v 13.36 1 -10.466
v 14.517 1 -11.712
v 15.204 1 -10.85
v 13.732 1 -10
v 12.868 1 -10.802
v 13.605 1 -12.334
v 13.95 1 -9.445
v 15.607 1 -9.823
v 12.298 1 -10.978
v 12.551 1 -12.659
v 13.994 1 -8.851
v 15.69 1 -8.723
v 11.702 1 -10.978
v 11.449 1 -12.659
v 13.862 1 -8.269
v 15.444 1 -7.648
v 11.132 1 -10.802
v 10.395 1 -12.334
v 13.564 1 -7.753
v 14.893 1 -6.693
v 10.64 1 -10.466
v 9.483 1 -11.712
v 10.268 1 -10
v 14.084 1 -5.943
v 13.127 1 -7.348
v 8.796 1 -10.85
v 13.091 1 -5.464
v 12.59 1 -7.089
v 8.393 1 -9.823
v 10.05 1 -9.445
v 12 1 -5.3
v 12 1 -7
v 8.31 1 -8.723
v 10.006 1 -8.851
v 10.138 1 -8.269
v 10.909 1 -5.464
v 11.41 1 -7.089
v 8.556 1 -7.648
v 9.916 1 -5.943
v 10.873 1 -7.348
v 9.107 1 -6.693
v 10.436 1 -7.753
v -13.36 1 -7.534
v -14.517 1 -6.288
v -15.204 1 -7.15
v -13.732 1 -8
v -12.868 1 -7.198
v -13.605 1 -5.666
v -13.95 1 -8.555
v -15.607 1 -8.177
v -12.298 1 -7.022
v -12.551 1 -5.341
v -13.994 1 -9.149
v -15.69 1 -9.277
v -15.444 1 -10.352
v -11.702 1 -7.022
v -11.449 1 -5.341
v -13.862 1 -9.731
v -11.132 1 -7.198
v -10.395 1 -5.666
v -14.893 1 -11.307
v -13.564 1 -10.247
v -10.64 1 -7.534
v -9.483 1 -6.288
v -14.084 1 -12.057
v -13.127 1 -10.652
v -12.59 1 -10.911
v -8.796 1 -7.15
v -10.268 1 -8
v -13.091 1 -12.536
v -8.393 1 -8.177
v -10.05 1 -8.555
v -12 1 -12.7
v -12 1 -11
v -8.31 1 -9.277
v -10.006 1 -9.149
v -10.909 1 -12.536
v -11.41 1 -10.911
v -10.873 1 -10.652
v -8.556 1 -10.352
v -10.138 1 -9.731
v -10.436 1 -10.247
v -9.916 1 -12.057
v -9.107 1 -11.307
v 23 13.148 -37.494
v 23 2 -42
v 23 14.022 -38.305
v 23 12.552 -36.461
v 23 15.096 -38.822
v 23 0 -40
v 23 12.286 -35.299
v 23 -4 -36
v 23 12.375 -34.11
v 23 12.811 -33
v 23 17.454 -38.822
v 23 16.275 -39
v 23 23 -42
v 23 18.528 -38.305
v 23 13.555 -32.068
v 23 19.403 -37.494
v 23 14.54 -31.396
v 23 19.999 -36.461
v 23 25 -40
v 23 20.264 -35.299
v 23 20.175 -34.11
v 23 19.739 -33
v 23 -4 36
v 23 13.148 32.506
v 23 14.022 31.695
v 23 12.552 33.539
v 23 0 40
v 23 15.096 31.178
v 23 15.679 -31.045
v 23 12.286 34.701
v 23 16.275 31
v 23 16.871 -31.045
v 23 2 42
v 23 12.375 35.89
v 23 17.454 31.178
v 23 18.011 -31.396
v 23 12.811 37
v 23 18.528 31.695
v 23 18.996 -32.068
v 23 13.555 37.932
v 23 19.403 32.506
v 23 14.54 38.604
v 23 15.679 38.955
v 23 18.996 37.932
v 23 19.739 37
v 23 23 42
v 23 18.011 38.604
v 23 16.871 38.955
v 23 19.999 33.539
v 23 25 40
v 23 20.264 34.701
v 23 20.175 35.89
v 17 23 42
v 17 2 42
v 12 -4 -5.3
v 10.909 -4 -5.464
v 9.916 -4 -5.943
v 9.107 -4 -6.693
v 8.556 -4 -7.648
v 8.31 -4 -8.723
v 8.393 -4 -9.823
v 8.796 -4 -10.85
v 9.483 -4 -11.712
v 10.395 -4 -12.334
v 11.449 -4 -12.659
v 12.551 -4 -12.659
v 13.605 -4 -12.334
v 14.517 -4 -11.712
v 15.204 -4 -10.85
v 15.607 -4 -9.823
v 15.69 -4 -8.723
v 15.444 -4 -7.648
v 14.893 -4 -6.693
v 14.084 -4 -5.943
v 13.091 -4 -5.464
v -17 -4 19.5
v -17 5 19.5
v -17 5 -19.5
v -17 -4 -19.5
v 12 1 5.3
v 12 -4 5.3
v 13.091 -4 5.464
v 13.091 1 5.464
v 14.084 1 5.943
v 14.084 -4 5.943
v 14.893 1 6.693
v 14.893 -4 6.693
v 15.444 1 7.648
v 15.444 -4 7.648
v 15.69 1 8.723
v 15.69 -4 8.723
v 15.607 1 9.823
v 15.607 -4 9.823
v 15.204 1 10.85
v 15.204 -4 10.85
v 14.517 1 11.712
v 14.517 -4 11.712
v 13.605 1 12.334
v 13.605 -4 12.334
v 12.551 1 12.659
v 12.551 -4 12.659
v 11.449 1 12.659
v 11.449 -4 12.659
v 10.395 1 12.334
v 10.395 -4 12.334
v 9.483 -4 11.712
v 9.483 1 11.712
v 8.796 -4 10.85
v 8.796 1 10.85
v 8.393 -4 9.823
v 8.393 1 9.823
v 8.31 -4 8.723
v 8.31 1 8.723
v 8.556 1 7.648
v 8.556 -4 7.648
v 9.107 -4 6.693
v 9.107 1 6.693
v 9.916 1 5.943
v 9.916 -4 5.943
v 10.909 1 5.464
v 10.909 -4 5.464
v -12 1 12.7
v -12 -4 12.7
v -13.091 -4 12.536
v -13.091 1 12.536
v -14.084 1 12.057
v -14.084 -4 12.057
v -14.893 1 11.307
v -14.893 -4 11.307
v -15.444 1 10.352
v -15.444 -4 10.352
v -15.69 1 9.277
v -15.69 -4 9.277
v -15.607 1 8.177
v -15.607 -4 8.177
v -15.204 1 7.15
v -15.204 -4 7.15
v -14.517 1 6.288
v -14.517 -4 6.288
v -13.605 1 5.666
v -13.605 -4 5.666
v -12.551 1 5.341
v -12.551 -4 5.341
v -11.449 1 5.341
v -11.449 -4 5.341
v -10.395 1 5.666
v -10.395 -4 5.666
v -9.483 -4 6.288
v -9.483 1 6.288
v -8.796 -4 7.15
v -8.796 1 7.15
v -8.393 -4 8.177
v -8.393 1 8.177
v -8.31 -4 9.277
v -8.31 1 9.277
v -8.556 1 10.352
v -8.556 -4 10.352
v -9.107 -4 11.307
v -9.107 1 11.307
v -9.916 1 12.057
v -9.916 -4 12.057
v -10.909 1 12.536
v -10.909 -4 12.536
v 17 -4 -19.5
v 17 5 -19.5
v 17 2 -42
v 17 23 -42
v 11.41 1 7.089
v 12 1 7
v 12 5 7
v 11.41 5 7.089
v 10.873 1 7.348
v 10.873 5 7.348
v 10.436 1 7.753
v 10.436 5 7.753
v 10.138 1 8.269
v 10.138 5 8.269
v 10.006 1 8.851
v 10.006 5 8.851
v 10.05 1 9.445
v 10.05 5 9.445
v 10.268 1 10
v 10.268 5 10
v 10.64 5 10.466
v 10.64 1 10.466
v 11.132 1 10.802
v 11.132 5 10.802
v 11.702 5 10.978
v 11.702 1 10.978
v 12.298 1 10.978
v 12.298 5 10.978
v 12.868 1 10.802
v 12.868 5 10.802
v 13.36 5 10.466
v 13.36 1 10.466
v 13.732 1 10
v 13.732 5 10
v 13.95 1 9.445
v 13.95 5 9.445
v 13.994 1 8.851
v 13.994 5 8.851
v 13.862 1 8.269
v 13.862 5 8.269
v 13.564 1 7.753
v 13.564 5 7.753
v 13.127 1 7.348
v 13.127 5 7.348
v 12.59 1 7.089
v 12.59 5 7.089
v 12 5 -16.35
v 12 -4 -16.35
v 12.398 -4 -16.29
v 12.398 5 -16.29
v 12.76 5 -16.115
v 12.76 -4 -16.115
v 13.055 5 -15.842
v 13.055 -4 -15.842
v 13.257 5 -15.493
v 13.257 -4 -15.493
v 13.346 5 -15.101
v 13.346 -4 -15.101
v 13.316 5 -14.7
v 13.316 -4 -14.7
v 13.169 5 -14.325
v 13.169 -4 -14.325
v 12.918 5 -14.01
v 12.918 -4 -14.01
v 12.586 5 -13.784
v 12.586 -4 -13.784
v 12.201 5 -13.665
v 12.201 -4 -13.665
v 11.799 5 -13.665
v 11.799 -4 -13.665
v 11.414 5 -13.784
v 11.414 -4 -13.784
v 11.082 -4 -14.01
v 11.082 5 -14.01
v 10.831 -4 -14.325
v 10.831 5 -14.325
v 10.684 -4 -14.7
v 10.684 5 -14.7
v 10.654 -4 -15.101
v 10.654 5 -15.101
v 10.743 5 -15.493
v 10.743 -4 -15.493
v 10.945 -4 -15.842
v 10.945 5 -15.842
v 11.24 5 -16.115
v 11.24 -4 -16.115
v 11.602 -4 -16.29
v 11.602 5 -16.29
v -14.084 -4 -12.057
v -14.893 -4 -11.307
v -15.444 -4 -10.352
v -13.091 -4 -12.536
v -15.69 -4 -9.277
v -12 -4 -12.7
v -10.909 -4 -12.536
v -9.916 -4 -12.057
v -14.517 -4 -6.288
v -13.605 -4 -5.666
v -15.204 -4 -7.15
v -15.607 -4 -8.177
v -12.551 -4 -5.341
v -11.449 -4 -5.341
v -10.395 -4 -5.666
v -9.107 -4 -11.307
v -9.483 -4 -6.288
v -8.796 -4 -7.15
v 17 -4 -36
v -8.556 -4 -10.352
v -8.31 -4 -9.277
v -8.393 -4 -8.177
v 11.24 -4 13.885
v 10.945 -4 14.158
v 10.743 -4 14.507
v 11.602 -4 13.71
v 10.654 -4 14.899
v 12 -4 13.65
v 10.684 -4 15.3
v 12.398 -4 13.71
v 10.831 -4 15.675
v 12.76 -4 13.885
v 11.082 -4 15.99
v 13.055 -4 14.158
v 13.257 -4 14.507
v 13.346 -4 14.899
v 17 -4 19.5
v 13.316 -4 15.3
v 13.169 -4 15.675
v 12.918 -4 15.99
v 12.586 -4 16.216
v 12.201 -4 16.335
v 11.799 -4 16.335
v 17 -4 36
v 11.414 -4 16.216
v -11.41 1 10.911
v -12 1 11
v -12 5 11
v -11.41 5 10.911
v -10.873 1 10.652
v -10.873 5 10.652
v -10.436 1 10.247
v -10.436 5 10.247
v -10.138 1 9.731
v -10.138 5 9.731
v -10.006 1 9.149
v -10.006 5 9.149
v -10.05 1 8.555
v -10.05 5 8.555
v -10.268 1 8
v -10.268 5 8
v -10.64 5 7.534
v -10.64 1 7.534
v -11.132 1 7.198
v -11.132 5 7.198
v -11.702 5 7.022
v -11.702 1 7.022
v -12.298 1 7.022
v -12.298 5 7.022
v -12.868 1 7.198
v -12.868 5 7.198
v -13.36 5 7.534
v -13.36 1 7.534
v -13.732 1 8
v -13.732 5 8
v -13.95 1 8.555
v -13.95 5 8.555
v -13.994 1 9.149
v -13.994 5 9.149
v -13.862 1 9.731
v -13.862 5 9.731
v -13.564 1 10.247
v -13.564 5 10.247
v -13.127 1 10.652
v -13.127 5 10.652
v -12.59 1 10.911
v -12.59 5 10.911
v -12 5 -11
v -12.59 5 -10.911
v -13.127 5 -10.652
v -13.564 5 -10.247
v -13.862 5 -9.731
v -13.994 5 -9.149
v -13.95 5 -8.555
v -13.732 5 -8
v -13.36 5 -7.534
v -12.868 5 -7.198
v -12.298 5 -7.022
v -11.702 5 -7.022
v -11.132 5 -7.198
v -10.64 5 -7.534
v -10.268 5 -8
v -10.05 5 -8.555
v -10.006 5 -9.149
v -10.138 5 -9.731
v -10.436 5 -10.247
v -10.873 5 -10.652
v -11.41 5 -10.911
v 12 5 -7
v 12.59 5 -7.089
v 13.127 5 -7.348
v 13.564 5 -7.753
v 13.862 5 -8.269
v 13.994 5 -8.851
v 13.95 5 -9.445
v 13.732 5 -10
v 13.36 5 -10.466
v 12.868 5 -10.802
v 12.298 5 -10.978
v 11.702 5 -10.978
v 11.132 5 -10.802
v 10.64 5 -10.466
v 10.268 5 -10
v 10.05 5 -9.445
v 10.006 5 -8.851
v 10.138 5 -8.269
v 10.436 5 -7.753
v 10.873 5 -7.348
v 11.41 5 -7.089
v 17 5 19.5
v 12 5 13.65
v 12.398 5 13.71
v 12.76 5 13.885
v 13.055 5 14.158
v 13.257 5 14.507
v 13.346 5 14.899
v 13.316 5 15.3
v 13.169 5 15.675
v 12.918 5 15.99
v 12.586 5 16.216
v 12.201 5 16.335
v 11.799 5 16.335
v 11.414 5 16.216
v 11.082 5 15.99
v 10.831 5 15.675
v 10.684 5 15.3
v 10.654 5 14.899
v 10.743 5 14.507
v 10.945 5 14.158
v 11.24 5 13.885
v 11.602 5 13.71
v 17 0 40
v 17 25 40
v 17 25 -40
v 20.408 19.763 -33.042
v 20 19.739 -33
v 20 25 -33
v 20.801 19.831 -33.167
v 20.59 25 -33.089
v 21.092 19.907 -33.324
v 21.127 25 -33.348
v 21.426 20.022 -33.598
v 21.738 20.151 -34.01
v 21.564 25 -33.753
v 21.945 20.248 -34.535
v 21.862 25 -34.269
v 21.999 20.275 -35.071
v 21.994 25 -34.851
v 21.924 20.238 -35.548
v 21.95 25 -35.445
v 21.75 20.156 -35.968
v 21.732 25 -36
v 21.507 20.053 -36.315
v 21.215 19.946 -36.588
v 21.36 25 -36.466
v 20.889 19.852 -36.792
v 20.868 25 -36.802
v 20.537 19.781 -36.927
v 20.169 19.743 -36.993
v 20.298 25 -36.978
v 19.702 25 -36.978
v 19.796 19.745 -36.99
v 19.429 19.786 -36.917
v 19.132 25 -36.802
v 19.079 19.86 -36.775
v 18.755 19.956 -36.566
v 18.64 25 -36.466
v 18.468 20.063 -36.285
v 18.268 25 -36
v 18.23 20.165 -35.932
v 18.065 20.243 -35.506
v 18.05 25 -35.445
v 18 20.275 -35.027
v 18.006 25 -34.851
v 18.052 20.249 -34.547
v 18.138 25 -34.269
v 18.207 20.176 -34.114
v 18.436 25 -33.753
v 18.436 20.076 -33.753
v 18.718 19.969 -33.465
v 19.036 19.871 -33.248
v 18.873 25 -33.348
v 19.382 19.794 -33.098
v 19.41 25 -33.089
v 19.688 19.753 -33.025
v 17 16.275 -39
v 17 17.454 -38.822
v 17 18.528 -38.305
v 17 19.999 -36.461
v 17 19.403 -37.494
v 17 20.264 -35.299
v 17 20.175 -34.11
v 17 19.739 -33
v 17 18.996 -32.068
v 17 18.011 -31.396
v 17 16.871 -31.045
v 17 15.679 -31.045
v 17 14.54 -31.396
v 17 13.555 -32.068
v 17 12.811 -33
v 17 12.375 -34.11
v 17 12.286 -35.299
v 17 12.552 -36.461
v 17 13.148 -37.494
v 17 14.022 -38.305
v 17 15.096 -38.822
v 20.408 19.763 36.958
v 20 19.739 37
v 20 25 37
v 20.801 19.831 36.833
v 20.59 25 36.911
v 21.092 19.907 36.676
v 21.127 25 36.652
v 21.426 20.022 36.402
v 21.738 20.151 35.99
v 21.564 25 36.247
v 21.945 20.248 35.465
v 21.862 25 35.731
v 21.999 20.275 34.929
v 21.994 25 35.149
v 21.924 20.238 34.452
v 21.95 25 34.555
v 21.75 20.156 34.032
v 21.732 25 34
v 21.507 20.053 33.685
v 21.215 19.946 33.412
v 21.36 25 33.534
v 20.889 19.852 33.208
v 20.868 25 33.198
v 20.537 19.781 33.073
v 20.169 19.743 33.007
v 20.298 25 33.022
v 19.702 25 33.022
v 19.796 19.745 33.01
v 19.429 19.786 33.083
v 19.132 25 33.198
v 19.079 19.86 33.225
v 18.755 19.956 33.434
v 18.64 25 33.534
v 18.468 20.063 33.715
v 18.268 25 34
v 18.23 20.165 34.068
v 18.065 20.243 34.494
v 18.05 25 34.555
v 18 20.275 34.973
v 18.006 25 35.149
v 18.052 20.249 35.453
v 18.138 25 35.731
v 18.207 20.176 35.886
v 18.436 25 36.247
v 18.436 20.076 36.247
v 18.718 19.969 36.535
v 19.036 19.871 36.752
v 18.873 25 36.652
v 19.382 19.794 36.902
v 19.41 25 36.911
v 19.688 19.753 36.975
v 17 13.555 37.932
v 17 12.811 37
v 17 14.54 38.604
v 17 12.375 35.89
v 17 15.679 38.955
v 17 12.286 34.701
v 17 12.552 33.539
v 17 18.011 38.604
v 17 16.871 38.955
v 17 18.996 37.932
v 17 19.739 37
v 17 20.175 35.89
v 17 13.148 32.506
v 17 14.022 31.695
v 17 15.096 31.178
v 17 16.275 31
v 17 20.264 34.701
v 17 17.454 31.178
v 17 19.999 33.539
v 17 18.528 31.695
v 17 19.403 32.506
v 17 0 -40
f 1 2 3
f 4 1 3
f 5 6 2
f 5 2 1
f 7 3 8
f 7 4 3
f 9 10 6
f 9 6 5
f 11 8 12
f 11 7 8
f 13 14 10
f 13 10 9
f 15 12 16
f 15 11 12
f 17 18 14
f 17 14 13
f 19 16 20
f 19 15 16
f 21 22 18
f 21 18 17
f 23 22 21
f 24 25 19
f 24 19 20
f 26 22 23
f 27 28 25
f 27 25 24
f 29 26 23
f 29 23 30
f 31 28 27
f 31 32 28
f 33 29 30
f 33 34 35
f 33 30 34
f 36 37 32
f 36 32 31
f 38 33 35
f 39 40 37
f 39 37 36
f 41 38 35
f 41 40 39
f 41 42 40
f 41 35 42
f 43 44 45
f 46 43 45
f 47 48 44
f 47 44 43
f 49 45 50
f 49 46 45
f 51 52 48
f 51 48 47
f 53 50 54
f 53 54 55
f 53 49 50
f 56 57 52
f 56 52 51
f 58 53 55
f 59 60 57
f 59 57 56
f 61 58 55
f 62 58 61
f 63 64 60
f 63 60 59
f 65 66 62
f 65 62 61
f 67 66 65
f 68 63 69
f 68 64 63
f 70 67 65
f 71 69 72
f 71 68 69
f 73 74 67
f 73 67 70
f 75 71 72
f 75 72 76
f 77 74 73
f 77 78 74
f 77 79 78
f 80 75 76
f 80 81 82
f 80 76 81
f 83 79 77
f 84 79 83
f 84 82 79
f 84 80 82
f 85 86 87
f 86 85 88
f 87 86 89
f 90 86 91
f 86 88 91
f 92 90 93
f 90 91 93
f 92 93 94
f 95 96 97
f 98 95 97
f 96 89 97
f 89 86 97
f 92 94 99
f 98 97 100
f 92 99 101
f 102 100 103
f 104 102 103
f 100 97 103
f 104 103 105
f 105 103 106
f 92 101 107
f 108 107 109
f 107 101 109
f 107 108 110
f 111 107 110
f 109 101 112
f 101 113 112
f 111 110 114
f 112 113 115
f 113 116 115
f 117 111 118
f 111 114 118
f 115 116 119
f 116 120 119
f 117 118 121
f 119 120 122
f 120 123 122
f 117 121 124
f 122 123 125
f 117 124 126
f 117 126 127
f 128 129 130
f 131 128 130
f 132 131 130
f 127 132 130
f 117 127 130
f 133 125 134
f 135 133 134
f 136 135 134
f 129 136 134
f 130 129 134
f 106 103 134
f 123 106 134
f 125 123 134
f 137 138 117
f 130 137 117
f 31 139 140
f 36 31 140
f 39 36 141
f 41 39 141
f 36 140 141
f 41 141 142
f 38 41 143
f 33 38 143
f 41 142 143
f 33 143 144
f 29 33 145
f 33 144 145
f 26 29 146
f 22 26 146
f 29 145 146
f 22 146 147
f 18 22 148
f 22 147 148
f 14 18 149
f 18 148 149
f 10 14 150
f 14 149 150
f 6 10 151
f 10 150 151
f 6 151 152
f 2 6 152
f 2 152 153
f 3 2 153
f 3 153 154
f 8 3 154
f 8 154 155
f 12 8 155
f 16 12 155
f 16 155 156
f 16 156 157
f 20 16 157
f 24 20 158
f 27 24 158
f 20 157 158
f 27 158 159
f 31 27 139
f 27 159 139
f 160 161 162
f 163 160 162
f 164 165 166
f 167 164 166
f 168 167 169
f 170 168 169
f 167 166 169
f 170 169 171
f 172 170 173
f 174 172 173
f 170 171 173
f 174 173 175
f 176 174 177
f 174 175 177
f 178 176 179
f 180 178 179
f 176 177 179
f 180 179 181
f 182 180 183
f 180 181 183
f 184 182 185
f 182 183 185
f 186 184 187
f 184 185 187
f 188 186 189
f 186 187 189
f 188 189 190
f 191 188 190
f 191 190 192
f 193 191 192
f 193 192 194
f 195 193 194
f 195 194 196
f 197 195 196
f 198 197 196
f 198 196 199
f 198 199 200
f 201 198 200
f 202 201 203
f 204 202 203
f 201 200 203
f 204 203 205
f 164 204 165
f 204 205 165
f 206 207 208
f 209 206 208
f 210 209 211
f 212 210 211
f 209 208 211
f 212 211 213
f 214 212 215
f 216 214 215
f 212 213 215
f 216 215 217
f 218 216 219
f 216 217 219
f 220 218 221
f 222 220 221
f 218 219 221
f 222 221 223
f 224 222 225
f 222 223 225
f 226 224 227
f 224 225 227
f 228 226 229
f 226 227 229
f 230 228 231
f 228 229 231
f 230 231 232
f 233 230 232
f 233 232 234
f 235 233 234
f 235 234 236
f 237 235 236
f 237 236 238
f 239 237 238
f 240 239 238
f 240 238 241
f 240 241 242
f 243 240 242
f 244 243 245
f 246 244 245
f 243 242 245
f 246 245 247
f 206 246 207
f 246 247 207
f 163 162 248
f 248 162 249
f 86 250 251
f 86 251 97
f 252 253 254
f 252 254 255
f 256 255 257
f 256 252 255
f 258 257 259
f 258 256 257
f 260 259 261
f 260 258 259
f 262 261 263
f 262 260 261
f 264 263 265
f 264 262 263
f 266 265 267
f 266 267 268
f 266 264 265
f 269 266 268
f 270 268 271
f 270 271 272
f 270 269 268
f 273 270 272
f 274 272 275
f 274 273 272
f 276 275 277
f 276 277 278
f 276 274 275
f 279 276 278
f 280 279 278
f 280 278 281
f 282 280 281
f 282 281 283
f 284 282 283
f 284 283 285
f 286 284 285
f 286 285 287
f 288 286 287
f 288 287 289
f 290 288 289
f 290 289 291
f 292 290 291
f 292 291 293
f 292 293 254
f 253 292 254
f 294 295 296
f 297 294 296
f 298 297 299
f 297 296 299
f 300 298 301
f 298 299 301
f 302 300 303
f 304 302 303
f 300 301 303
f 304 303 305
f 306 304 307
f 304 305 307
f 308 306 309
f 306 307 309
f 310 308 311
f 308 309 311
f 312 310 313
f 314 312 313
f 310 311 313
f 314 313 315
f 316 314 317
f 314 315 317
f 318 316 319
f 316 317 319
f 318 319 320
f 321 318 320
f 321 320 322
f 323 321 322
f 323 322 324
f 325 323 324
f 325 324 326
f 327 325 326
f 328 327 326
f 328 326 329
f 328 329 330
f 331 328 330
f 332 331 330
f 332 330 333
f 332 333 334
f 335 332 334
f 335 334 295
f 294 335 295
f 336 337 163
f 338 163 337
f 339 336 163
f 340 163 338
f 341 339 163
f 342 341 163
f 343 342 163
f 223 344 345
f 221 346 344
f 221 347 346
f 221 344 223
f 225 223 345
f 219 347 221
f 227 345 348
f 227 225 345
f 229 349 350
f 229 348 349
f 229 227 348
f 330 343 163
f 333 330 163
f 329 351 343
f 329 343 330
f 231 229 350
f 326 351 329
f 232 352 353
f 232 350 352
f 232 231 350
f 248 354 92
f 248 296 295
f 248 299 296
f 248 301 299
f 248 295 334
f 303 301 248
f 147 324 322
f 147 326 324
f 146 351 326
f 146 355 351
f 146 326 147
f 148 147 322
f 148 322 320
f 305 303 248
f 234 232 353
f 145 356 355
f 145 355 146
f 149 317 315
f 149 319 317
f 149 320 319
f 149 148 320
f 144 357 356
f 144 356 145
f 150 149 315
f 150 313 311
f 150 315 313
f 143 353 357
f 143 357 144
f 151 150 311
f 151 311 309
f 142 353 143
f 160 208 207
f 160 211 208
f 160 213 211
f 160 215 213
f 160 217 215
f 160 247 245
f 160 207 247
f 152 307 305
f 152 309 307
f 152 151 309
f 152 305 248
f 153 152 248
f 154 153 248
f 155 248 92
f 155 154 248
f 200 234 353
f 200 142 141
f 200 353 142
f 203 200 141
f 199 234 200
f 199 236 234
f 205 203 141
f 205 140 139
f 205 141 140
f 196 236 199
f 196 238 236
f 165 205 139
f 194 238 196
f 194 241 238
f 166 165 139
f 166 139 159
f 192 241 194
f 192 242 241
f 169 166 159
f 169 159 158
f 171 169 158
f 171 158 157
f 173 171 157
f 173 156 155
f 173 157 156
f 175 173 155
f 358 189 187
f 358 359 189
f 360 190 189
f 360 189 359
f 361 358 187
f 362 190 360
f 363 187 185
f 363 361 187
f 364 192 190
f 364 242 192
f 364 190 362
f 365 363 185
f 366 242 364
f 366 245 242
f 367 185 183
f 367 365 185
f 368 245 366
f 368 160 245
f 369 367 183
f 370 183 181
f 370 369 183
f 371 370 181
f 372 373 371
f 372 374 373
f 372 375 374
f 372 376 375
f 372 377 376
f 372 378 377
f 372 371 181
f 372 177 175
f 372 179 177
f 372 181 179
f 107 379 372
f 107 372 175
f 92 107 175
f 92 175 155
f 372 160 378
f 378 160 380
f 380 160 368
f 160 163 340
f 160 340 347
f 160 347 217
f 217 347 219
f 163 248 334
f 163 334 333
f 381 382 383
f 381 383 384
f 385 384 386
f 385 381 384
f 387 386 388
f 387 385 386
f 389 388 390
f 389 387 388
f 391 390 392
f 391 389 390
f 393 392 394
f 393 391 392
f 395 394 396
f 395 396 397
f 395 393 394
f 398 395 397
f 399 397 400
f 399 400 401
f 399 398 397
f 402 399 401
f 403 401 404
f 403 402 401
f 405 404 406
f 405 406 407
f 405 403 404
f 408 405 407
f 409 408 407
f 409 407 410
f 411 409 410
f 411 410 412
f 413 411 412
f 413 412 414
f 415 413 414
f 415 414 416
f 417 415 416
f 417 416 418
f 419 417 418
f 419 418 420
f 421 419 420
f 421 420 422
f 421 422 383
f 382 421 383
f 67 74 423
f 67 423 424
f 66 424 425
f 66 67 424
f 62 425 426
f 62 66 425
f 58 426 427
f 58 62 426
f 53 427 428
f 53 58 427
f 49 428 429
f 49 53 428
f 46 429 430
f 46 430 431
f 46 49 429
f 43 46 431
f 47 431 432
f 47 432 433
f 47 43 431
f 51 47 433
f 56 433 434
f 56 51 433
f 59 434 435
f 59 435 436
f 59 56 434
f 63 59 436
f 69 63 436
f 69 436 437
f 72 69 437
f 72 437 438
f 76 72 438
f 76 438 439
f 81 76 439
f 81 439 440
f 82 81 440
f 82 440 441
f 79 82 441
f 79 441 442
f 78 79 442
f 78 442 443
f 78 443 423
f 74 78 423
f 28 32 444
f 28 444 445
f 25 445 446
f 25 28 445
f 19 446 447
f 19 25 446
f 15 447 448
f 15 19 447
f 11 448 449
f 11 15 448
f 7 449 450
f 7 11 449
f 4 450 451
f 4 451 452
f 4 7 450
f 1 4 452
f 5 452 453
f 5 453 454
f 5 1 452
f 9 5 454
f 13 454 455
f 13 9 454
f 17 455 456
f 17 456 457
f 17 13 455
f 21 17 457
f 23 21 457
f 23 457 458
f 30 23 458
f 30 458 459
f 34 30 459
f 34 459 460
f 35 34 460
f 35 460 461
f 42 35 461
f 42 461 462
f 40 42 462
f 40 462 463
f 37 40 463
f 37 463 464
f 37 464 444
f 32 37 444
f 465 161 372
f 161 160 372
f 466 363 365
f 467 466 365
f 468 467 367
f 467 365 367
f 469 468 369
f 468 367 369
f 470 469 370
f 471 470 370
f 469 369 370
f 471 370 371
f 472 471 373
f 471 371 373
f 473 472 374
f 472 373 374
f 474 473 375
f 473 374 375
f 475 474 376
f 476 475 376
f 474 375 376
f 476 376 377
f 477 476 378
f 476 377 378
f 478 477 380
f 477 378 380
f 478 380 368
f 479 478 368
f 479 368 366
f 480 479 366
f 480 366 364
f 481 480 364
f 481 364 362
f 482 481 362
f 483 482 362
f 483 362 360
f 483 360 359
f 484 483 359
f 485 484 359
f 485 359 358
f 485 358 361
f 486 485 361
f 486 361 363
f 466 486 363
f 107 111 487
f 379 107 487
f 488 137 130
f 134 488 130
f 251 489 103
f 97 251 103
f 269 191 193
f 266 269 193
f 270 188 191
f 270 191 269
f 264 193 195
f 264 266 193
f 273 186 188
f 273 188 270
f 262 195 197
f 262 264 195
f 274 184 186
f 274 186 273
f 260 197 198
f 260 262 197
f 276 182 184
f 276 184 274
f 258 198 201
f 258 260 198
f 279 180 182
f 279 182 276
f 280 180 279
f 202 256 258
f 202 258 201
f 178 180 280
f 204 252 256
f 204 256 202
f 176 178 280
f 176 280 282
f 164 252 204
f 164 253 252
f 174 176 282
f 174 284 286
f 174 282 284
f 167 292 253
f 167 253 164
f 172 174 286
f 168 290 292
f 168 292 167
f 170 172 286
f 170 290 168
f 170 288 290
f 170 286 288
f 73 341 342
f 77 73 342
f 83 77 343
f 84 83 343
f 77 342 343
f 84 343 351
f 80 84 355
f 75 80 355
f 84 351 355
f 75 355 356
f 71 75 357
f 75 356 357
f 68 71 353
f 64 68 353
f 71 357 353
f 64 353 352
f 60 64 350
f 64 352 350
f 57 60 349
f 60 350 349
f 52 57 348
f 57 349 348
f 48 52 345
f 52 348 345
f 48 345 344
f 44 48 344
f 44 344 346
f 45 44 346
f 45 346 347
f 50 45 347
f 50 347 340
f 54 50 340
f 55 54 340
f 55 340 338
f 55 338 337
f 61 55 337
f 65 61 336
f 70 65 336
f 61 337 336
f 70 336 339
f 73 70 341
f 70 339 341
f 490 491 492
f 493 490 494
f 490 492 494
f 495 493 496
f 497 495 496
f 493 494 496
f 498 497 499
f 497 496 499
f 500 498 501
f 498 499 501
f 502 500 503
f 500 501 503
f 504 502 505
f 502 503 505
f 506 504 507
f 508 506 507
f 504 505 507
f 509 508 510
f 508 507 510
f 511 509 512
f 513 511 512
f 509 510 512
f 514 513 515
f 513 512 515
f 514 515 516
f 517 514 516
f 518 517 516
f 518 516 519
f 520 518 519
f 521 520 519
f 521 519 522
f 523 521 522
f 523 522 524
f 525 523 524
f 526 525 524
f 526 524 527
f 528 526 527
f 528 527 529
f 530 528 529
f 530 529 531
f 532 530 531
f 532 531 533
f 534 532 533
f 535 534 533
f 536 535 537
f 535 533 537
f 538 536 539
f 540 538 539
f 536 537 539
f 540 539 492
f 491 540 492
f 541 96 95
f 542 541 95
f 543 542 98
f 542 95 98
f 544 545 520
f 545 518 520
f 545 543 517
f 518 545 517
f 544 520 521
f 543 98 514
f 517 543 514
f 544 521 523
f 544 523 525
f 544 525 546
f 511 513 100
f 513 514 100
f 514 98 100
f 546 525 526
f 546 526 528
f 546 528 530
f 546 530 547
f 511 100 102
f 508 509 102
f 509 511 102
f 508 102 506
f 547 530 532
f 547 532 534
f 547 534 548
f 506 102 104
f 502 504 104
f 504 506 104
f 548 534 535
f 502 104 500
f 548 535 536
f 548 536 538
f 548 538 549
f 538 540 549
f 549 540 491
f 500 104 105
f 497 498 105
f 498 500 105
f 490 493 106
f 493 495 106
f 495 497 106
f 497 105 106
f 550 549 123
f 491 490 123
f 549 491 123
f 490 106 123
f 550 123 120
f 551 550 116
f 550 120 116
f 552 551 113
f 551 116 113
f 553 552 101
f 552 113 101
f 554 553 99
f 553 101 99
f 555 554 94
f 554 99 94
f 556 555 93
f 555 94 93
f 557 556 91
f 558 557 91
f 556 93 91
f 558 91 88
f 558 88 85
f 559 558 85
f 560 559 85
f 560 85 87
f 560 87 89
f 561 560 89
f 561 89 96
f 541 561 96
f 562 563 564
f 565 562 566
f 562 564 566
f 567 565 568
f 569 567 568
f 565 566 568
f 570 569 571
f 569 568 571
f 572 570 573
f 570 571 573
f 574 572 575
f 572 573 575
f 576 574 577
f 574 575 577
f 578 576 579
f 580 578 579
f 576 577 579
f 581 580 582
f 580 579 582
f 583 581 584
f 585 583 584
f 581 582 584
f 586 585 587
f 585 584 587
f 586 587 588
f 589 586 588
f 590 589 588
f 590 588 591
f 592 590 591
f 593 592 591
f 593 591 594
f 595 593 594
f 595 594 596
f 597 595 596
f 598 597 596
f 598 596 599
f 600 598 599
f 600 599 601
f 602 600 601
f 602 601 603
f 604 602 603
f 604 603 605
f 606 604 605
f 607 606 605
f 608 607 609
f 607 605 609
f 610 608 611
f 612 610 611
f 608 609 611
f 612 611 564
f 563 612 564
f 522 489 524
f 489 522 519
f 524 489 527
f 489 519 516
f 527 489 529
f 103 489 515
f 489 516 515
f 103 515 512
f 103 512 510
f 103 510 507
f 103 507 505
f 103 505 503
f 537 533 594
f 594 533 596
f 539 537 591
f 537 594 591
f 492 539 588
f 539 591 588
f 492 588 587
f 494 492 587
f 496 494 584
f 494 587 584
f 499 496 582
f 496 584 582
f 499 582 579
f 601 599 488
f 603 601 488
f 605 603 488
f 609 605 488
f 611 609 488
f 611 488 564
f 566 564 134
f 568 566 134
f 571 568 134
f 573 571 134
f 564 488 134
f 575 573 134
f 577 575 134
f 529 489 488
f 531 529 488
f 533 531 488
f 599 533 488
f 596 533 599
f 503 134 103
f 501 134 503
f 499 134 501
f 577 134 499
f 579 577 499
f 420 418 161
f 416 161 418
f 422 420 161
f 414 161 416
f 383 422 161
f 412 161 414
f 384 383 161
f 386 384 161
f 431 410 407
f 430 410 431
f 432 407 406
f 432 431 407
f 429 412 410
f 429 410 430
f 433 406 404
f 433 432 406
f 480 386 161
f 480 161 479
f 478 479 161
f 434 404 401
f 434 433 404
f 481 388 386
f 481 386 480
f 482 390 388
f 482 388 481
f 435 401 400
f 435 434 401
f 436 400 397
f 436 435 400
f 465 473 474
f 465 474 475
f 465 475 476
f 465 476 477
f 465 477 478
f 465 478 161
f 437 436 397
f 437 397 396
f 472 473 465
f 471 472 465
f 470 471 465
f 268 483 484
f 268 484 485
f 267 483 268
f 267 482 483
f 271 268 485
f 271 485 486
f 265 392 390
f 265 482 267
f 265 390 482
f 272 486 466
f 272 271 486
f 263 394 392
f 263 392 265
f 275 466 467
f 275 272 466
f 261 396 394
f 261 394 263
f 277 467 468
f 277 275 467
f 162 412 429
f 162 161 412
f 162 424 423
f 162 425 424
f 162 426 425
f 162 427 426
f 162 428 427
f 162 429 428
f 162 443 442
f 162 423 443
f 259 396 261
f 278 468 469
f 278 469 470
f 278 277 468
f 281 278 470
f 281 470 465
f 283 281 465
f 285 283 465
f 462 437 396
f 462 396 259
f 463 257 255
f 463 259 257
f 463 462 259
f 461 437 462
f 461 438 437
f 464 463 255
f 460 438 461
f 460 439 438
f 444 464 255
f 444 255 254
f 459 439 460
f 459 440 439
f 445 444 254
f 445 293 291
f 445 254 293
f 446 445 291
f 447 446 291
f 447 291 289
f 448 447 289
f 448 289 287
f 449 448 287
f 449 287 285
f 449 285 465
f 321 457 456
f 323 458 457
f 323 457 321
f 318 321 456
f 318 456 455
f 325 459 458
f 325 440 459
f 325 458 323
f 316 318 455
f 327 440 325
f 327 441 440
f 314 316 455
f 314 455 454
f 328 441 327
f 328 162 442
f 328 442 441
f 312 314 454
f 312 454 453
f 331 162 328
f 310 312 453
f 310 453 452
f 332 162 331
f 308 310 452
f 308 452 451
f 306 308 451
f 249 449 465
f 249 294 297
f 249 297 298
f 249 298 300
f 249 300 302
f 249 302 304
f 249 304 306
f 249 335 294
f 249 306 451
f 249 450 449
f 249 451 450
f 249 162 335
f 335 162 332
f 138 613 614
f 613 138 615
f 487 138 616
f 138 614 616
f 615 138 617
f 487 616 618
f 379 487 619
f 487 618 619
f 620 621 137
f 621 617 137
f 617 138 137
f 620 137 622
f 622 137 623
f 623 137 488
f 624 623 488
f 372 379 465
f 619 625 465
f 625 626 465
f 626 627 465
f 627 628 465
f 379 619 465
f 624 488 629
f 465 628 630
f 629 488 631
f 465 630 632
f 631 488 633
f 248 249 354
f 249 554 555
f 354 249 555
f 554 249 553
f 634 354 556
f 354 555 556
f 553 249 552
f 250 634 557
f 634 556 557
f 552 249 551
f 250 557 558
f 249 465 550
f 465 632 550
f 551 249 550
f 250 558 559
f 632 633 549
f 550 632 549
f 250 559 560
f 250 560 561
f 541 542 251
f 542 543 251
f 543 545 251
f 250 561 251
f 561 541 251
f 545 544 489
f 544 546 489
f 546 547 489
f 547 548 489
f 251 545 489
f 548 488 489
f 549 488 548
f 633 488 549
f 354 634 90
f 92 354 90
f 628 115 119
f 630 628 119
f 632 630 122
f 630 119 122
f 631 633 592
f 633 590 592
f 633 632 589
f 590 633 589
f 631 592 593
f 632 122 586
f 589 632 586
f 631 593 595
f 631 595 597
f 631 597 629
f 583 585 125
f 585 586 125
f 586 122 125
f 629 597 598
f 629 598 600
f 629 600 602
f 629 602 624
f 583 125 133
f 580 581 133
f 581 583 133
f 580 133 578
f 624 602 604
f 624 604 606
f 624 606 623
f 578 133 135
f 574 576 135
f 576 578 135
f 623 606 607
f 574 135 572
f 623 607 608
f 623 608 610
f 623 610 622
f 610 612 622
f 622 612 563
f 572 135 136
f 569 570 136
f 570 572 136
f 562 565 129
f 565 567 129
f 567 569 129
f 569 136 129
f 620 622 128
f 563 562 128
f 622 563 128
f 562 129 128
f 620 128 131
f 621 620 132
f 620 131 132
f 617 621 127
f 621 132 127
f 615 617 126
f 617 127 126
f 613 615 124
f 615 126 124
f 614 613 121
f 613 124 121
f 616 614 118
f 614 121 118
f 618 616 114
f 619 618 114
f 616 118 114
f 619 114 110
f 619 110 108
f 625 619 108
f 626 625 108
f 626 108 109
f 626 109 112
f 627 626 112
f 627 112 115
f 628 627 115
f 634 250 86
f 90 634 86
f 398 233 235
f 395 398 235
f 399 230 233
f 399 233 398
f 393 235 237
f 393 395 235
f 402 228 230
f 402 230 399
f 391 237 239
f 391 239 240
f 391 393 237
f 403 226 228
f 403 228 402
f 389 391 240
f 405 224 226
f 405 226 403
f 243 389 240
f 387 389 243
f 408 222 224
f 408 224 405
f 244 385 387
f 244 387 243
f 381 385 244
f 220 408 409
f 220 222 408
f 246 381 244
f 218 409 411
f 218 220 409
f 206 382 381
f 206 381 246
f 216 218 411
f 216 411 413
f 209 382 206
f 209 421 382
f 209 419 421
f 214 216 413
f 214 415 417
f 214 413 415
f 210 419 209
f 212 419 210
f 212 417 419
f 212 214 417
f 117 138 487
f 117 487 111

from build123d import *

# Parameters (mm, degrees)
SKETCH1_W           = 34
SKETCH1_H           = 39
SKETCH1_R           = 2
BOSS_EXTRUDE1_DEPTH = 5
SKETCH2_W           = 6
SKETCH2_H           = 84
BOSS_EXTRUDE2_DEPTH = 25
CUT_EXTRUDE2_REACH  = 65.159
SKETCH3_R           = 4
CHAMFER1_SIZE       = 2
SKETCH4_R           = 2
CUT_EXTRUDE3_DEPTH  = 10
BOSS_EXTRUDE3_DEPTH = 4
SKETCH6_R           = 3.7
CUT_EXTRUDE4_DEPTH  = 5
CHAMFER2_SIZE       = 4
CUT_EXTRUDE5_REACH  = 57.982
SKETCH7_R           = 1.35


with BuildPart() as part:
    # Sketch1 → Boss-Extrude1 (new body)
    with BuildSketch(Plane(origin=(0, 0, 0), x_dir=(1, 0, 0), z_dir=(0, 1, 0))):
        Rectangle(SKETCH1_W, SKETCH1_H)
        with Locations(Location((-12, -9, 0), (0, 0, 270))):
            Circle(SKETCH1_R, mode=Mode.SUBTRACT)
        with Locations(Location((12, -9, 0), (0, 0, 90))):
            Circle(SKETCH1_R, mode=Mode.SUBTRACT)
        with Locations(Location((12, 9, 0), (0, 0, 270))):
            Circle(SKETCH1_R, mode=Mode.SUBTRACT)
        with Locations(Location((-12, 9, 0), (0, 0, 90))):
            Circle(SKETCH1_R, mode=Mode.SUBTRACT)
    extrude(amount=BOSS_EXTRUDE1_DEPTH)

    # Sketch2 → Boss-Extrude2 (add)
    with BuildSketch(Plane.XZ):
        with Locations((20, 0)):
            Rectangle(SKETCH2_W, SKETCH2_H)
    extrude(amount=-BOSS_EXTRUDE2_DEPTH)

    # Sketch3 → Cut-Extrude2 (cut, up to next)
    with BuildSketch(Plane(origin=(23, 0, 0), x_dir=(0, 0, -1), z_dir=(1, 0, 0)), mode=Mode.PRIVATE) as cut_extrude2_sk1:
        with Locations((-35, 16.275206728)):
            Circle(SKETCH3_R)
    cut_extrude2_tool1 = extrude(cut_extrude2_sk1.sketch, amount=-CUT_EXTRUDE2_REACH, mode=Mode.PRIVATE) & part.part
    # Sketch3 → Cut-Extrude2 (cut, up to next)
    with BuildSketch(Plane(origin=(23, 0, 0), x_dir=(0, 0, -1), z_dir=(1, 0, 0)), mode=Mode.PRIVATE) as cut_extrude2_sk2:
        with Locations((35, 16.275206728)):
            Circle(SKETCH3_R)
    cut_extrude2_tool2 = extrude(cut_extrude2_sk2.sketch, amount=-CUT_EXTRUDE2_REACH, mode=Mode.PRIVATE) & part.part
    add(cut_extrude2_tool1.solids().sort_by_distance((23, 16.275207, 35))[0], mode=Mode.SUBTRACT)
    add(cut_extrude2_tool2.solids().sort_by_distance((23, 16.275207, -35))[0], mode=Mode.SUBTRACT)

    # Chamfer1
    chamfer1_edges = [part.edges().sort_by_distance(p)[0] for p in [
        (20, 25, -42),
        (20, 25, 42),
        (20, 0, 42),
        (20, 0, -42),
    ]]
    chamfer(chamfer1_edges, length=CHAMFER1_SIZE)

    # Sketch4 → Cut-Extrude3 (cut)
    with BuildSketch(Plane(origin=(0, 25, 0), x_dir=(1, 0, 0), z_dir=(0, 1, 0))):
        with Locations(Location((20, 35, 0), (0, 0, 270))):
            Circle(SKETCH4_R)
        with Locations(Location((20, -35, 0), (0, 0, 270))):
            Circle(SKETCH4_R)
    extrude(amount=-CUT_EXTRUDE3_DEPTH, mode=Mode.SUBTRACT)

    # Sketch5 → Boss-Extrude3 (add)
    with BuildSketch(Plane.XZ):
        Polygon((17, -19.5), (17, -40), (23, -40), (23, 40), (17, 40), (17, 19.5), (-17, 19.5), (-17, -19.5), align=None)
    extrude(amount=BOSS_EXTRUDE3_DEPTH)

    # Sketch6 → Cut-Extrude4 (cut)
    with BuildSketch(Plane.XZ.offset(4)):
        with Locations(Location((-12, -9, 0), (0, 0, 270))):
            Circle(SKETCH6_R)
        with Locations(Location((12, -9, 0), (0, 0, 90))):
            Circle(SKETCH6_R)
        with Locations(Location((12, 9, 0), (0, 0, 270))):
            Circle(SKETCH6_R)
        with Locations(Location((-12, 9, 0), (0, 0, 90))):
            Circle(SKETCH6_R)
    extrude(amount=-CUT_EXTRUDE4_DEPTH, mode=Mode.SUBTRACT)

    # Chamfer2
    chamfer2_edges = [part.edges().sort_by_distance(p)[0] for p in [
        (20, -4, 40),
        (20, -4, -40),
    ]]
    chamfer(chamfer2_edges, length=CHAMFER2_SIZE - 0.0001)  # a hair under: the kernel refuses the full size

    # Sketch7 → Cut-Extrude5 (cut, up to next)
    with BuildSketch(Plane.XZ.offset(4), mode=Mode.PRIVATE) as cut_extrude5_sk1:
        with Locations(Location((12, 15, 0), (0, 0, 270))):
            Circle(SKETCH7_R)
    cut_extrude5_tool1 = extrude(cut_extrude5_sk1.sketch, amount=-CUT_EXTRUDE5_REACH, mode=Mode.PRIVATE) & part.part
    # Sketch7 → Cut-Extrude5 (cut, up to next)
    with BuildSketch(Plane.XZ.offset(4), mode=Mode.PRIVATE) as cut_extrude5_sk2:
        with Locations(Location((12, -15, 0), (0, 0, 270))):
            Circle(SKETCH7_R)
    cut_extrude5_tool2 = extrude(cut_extrude5_sk2.sketch, amount=-CUT_EXTRUDE5_REACH, mode=Mode.PRIVATE) & part.part
    add(cut_extrude5_tool1.solids().sort_by_distance((12, -4, 15))[0], mode=Mode.SUBTRACT)
    add(cut_extrude5_tool2.solids().sort_by_distance((12, -4, -15))[0], mode=Mode.SUBTRACT)


solid = part.part
